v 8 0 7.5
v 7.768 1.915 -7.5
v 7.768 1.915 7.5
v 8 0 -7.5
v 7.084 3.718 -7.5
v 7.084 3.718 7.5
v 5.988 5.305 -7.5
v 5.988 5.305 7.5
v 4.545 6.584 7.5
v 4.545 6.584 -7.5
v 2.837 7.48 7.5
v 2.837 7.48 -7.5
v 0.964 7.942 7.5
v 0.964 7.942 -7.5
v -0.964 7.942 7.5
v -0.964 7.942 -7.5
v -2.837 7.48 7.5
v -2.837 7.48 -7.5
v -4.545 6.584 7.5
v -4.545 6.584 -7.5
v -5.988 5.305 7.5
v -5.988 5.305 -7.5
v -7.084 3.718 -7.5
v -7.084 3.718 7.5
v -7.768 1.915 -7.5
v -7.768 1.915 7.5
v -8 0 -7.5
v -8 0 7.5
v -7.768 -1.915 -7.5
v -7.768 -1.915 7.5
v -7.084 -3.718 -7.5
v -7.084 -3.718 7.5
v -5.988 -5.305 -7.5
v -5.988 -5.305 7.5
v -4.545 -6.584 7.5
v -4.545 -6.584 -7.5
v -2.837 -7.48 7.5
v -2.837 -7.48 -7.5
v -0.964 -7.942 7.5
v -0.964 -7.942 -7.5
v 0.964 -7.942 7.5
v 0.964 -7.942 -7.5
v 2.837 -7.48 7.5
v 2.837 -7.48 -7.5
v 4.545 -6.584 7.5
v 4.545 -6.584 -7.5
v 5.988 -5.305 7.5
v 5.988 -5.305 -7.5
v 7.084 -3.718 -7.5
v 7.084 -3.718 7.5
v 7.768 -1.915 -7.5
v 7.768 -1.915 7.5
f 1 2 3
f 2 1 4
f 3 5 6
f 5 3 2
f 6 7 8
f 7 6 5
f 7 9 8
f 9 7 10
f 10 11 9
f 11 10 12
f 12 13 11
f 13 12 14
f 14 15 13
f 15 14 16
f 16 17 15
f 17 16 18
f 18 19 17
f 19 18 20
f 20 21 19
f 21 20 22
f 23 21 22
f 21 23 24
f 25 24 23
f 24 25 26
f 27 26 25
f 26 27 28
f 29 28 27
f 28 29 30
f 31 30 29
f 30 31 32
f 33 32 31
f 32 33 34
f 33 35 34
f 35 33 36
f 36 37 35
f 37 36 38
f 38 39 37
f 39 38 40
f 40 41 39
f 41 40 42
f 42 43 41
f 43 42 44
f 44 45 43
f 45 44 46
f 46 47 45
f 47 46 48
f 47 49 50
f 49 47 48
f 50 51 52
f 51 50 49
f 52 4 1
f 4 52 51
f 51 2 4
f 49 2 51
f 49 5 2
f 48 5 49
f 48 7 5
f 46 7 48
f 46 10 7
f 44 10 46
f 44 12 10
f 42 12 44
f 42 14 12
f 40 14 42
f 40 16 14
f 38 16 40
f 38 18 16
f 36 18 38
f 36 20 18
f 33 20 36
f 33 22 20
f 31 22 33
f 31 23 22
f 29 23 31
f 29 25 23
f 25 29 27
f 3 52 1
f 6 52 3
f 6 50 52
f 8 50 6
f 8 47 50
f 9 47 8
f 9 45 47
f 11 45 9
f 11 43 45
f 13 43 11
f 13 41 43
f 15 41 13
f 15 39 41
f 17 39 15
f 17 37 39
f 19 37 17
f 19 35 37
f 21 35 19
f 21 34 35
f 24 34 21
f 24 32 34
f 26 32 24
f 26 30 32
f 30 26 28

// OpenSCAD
// Generated by generate_scads.py
cylinder(h=15, r=8, center=true);
